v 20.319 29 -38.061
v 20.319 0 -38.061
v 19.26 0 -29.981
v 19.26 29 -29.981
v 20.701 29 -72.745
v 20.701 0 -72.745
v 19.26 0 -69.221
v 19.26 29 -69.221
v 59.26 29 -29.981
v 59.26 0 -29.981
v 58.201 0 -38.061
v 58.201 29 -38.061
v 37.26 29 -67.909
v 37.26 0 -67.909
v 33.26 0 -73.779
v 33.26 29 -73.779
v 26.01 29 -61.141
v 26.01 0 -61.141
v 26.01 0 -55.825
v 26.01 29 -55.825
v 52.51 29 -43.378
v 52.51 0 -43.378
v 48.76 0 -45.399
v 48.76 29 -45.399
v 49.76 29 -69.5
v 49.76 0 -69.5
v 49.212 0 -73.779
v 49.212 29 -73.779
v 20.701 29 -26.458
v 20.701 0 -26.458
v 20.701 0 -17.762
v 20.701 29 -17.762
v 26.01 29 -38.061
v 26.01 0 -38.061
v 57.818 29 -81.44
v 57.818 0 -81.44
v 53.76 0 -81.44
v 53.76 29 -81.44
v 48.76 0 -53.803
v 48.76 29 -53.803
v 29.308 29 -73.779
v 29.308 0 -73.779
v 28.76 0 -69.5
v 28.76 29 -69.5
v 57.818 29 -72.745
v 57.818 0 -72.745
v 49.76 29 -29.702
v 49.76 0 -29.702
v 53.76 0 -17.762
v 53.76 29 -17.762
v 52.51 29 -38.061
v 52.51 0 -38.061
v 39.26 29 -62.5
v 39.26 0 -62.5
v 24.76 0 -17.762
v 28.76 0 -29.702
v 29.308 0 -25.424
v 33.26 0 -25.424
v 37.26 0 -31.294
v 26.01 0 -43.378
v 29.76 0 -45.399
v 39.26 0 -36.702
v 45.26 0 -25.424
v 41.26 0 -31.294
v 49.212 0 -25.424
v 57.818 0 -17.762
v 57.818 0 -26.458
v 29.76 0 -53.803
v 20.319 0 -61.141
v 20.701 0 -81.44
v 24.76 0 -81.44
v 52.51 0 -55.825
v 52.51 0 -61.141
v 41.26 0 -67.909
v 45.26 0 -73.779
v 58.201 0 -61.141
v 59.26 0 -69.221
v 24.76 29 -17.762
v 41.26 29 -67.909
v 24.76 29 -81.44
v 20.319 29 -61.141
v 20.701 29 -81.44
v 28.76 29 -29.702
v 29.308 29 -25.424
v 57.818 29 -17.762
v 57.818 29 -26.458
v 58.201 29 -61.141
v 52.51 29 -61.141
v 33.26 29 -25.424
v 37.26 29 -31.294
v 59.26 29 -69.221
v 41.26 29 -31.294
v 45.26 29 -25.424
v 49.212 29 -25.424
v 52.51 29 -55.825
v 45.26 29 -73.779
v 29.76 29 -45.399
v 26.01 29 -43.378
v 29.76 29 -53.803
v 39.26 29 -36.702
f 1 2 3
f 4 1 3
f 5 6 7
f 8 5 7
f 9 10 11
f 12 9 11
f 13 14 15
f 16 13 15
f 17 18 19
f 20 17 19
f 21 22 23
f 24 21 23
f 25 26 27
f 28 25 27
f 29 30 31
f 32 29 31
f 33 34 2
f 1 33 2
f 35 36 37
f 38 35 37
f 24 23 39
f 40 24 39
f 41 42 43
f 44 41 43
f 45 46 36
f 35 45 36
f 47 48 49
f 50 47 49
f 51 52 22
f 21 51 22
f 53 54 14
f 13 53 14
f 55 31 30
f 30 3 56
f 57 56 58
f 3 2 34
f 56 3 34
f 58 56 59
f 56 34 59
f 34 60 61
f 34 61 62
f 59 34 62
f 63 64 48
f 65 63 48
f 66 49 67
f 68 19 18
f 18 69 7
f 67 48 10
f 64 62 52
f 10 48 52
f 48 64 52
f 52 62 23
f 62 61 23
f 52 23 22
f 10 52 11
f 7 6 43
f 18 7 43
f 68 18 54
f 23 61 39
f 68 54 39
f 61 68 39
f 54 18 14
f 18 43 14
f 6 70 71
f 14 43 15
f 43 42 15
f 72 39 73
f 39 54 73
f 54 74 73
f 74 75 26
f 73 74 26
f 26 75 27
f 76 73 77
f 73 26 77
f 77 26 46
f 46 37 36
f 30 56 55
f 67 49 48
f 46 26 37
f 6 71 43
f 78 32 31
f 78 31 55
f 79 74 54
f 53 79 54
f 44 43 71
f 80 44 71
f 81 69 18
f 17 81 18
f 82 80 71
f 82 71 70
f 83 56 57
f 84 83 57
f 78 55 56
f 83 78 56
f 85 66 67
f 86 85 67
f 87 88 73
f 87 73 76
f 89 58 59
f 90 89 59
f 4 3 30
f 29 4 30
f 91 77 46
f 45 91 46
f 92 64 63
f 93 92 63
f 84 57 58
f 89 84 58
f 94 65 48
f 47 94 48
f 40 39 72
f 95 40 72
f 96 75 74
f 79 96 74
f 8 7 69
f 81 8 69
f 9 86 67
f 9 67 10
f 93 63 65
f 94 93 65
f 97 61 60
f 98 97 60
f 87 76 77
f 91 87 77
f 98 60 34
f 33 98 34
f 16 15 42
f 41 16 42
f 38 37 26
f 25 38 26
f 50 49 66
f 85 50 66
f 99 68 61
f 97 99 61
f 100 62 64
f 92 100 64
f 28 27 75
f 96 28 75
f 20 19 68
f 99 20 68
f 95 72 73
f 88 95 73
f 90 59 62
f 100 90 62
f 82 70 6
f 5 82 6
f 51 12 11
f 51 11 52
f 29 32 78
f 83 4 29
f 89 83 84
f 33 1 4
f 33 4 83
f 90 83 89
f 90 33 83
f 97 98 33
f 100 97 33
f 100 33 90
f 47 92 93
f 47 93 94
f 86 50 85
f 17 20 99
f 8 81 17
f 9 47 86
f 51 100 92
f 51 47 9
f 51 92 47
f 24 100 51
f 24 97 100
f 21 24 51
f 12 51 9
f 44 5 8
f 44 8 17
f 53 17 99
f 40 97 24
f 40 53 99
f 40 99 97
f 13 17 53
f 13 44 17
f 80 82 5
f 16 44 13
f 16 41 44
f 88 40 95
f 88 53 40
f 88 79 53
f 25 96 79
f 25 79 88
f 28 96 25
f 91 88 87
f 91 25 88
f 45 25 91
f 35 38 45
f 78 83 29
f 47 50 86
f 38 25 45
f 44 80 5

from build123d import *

# Parameters (mm, degrees)
BOSS_EXTRUDE1_DEPTH = 29


with BuildPart() as part:
    # Sketch1 → Boss-Extrude1 (new body)
    with BuildSketch(Plane(origin=(0, 0, 0), x_dir=(1, 0, 0), z_dir=(0, 1, 0))):
        Polygon((24.759890606, 17.762425379), (28.759890606, 29.702343473), (29.307835455, 25.423793289), (33.259890606, 25.423793289), (37.259890606, 31.293559553), (39.259890606, 36.702343473), (41.259890606, 31.293559553), (45.259890606, 25.423793289), (49.211945756, 25.423793289), (49.759890606, 29.702343473), (53.759890606, 17.762425379), (57.818331734, 17.762425379), (57.818331734, 26.457588678), (59.259890606, 29.980893658), (58.200604263, 38.06142419), (52.509890606, 38.06142419), (52.509890606, 43.377759071), (48.759890606, 45.399346339), (48.759890606, 53.802982108), (52.509890606, 55.824569376), (52.509890606, 61.140904257), (58.200604263, 61.140904257), (59.259890606, 69.221434789), (57.818331734, 72.744739769), (57.818331734, 81.439903068), (53.759890606, 81.439903068), (49.759890606, 69.499984974), (49.211945756, 73.778535158), (45.259890606, 73.778535158), (41.259890606, 67.908768894), (39.259890606, 62.499984974), (37.259890606, 67.908768894), (33.259890606, 73.778535158), (29.307835455, 73.778535158), (28.759890606, 69.499984974), (24.759890606, 81.439903068), (20.701449477, 81.439903068), (20.701449477, 72.744739769), (19.259890606, 69.221434789), (20.319176948, 61.140904257), (26.009890606, 61.140904257), (26.009890606, 55.824569376), (29.759890606, 53.802982108), (29.759890606, 45.399346339), (26.009890606, 43.377759071), (26.009890606, 38.06142419), (20.319176948, 38.06142419), (19.259890606, 29.980893658), (20.701449477, 26.457588678), (20.701449477, 17.762425379), align=None)
    extrude(amount=BOSS_EXTRUDE1_DEPTH)


solid = part.part
